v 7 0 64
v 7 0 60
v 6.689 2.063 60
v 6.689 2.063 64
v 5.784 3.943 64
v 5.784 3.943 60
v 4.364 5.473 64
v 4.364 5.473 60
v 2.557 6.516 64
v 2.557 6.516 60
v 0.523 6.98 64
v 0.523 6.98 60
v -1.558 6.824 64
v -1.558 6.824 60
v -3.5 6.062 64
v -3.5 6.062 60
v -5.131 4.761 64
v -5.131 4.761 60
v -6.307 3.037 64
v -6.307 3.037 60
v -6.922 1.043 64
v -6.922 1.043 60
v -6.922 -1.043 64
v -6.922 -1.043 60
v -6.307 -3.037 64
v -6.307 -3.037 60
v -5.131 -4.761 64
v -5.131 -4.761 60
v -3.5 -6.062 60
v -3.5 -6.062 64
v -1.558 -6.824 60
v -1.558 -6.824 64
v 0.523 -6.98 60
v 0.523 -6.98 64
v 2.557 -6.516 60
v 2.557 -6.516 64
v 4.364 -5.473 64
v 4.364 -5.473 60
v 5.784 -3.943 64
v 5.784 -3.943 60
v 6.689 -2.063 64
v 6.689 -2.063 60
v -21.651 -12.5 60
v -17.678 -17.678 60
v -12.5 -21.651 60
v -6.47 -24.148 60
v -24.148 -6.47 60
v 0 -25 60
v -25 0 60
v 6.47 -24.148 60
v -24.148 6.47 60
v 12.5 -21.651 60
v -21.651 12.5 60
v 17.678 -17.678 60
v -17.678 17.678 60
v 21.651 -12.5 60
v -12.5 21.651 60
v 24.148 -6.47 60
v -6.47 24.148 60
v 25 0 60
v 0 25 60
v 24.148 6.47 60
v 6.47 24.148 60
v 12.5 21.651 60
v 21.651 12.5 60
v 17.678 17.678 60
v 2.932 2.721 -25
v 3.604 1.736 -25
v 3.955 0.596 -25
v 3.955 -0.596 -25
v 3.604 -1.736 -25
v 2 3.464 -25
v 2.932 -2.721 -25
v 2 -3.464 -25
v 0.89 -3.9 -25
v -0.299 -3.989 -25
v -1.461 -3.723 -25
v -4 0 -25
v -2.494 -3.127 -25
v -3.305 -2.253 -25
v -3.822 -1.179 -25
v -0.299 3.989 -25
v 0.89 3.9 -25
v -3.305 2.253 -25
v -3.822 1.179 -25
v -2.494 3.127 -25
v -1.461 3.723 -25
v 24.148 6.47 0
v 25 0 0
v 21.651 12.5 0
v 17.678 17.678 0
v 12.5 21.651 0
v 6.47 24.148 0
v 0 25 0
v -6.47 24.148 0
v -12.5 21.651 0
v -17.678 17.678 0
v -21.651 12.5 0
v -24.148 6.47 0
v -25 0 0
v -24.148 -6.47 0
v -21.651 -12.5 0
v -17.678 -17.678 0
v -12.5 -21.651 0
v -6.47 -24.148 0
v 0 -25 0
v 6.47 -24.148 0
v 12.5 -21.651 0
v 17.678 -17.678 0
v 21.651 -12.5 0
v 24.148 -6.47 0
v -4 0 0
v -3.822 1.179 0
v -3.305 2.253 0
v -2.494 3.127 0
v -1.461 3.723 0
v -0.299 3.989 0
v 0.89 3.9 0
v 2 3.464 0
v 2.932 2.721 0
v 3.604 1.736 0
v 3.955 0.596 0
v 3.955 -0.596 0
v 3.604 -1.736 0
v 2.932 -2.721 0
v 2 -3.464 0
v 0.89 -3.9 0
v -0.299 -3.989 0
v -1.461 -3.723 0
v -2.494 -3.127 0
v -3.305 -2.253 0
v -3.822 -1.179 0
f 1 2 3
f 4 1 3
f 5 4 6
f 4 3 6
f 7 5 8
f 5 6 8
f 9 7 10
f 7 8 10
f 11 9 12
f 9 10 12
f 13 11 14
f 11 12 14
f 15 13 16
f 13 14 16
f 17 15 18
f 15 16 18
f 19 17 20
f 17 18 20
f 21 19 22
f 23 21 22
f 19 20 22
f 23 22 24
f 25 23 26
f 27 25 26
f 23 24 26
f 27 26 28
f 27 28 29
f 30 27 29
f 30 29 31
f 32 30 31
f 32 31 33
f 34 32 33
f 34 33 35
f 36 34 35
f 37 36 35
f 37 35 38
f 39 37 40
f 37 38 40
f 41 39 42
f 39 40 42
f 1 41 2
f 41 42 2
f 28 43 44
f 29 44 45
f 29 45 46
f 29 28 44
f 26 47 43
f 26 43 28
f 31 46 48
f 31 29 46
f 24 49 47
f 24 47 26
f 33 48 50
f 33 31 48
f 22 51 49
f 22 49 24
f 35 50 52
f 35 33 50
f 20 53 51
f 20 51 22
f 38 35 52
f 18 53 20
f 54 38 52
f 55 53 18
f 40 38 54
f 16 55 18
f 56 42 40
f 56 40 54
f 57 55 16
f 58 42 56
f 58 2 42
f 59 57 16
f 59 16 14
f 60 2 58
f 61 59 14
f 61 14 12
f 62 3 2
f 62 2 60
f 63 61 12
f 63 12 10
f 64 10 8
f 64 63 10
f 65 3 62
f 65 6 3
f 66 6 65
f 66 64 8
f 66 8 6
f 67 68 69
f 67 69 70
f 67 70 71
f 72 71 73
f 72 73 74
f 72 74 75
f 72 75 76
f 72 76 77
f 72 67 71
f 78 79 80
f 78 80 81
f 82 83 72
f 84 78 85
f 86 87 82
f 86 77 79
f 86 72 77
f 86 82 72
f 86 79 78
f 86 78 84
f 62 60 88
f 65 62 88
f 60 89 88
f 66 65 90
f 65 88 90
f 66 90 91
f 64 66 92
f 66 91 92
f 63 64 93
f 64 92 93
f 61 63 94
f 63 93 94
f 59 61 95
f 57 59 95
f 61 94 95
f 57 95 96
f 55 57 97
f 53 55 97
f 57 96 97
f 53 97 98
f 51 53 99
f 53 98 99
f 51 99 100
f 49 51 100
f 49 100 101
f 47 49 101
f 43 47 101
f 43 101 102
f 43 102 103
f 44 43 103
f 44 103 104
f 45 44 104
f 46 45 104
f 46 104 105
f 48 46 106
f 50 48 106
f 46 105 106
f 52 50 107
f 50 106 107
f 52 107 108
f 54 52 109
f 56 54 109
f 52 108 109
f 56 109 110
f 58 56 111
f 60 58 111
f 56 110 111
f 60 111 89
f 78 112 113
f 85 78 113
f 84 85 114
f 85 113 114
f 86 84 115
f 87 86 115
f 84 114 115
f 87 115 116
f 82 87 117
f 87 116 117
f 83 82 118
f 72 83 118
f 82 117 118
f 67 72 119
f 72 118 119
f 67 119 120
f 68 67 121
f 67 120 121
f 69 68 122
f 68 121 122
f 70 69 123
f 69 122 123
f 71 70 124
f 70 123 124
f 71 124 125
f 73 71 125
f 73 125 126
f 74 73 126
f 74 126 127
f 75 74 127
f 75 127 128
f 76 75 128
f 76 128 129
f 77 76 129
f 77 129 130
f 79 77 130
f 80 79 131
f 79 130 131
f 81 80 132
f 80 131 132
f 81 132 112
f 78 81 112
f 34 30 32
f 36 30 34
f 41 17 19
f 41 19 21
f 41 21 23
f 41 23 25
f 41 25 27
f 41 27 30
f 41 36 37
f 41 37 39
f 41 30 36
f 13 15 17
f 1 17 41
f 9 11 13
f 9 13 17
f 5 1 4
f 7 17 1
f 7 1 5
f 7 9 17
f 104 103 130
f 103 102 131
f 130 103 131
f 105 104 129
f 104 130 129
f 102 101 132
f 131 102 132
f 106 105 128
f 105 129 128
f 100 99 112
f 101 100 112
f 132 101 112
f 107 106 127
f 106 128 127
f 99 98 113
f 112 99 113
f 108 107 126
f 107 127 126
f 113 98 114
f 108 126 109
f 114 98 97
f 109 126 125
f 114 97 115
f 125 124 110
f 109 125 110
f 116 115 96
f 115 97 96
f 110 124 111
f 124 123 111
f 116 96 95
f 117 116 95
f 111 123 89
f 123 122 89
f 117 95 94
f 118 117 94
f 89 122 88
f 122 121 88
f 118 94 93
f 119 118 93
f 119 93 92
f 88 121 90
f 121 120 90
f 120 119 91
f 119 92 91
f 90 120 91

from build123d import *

# Parameters (mm, degrees)
SKETCH1_R           = 25
BOSS_EXTRUDE1_DEPTH = 7
SKETCH2_R           = 4
BOSS_EXTRUDE3_DEPTH = 25
SKETCH3_R           = 25
BOSS_EXTRUDE4_DEPTH = 53
SKETCH4_R           = 7
BOSS_EXTRUDE5_DEPTH = 4


with BuildPart() as part:
    # Sketch1 → Boss-Extrude1 (new body)
    with BuildSketch(Plane.XY):
        Circle(SKETCH1_R)
    extrude(amount=BOSS_EXTRUDE1_DEPTH)

    # Sketch2 → Boss-Extrude3 (add)
    with BuildSketch(Plane(origin=(0, 0, 0), x_dir=(-1, 0, 0), z_dir=(0, 0, -1))):
        Circle(SKETCH2_R)
    extrude(amount=BOSS_EXTRUDE3_DEPTH)

    # Sketch3 → Boss-Extrude4 (add)
    with BuildSketch(Plane.XY.offset(7)):
        Circle(SKETCH3_R)
    extrude(amount=BOSS_EXTRUDE4_DEPTH)

    # Sketch4 → Boss-Extrude5 (add)
    with BuildSketch(Plane.XY.offset(60)):
        Circle(SKETCH4_R)
    extrude(amount=BOSS_EXTRUDE5_DEPTH)


solid = part.part
